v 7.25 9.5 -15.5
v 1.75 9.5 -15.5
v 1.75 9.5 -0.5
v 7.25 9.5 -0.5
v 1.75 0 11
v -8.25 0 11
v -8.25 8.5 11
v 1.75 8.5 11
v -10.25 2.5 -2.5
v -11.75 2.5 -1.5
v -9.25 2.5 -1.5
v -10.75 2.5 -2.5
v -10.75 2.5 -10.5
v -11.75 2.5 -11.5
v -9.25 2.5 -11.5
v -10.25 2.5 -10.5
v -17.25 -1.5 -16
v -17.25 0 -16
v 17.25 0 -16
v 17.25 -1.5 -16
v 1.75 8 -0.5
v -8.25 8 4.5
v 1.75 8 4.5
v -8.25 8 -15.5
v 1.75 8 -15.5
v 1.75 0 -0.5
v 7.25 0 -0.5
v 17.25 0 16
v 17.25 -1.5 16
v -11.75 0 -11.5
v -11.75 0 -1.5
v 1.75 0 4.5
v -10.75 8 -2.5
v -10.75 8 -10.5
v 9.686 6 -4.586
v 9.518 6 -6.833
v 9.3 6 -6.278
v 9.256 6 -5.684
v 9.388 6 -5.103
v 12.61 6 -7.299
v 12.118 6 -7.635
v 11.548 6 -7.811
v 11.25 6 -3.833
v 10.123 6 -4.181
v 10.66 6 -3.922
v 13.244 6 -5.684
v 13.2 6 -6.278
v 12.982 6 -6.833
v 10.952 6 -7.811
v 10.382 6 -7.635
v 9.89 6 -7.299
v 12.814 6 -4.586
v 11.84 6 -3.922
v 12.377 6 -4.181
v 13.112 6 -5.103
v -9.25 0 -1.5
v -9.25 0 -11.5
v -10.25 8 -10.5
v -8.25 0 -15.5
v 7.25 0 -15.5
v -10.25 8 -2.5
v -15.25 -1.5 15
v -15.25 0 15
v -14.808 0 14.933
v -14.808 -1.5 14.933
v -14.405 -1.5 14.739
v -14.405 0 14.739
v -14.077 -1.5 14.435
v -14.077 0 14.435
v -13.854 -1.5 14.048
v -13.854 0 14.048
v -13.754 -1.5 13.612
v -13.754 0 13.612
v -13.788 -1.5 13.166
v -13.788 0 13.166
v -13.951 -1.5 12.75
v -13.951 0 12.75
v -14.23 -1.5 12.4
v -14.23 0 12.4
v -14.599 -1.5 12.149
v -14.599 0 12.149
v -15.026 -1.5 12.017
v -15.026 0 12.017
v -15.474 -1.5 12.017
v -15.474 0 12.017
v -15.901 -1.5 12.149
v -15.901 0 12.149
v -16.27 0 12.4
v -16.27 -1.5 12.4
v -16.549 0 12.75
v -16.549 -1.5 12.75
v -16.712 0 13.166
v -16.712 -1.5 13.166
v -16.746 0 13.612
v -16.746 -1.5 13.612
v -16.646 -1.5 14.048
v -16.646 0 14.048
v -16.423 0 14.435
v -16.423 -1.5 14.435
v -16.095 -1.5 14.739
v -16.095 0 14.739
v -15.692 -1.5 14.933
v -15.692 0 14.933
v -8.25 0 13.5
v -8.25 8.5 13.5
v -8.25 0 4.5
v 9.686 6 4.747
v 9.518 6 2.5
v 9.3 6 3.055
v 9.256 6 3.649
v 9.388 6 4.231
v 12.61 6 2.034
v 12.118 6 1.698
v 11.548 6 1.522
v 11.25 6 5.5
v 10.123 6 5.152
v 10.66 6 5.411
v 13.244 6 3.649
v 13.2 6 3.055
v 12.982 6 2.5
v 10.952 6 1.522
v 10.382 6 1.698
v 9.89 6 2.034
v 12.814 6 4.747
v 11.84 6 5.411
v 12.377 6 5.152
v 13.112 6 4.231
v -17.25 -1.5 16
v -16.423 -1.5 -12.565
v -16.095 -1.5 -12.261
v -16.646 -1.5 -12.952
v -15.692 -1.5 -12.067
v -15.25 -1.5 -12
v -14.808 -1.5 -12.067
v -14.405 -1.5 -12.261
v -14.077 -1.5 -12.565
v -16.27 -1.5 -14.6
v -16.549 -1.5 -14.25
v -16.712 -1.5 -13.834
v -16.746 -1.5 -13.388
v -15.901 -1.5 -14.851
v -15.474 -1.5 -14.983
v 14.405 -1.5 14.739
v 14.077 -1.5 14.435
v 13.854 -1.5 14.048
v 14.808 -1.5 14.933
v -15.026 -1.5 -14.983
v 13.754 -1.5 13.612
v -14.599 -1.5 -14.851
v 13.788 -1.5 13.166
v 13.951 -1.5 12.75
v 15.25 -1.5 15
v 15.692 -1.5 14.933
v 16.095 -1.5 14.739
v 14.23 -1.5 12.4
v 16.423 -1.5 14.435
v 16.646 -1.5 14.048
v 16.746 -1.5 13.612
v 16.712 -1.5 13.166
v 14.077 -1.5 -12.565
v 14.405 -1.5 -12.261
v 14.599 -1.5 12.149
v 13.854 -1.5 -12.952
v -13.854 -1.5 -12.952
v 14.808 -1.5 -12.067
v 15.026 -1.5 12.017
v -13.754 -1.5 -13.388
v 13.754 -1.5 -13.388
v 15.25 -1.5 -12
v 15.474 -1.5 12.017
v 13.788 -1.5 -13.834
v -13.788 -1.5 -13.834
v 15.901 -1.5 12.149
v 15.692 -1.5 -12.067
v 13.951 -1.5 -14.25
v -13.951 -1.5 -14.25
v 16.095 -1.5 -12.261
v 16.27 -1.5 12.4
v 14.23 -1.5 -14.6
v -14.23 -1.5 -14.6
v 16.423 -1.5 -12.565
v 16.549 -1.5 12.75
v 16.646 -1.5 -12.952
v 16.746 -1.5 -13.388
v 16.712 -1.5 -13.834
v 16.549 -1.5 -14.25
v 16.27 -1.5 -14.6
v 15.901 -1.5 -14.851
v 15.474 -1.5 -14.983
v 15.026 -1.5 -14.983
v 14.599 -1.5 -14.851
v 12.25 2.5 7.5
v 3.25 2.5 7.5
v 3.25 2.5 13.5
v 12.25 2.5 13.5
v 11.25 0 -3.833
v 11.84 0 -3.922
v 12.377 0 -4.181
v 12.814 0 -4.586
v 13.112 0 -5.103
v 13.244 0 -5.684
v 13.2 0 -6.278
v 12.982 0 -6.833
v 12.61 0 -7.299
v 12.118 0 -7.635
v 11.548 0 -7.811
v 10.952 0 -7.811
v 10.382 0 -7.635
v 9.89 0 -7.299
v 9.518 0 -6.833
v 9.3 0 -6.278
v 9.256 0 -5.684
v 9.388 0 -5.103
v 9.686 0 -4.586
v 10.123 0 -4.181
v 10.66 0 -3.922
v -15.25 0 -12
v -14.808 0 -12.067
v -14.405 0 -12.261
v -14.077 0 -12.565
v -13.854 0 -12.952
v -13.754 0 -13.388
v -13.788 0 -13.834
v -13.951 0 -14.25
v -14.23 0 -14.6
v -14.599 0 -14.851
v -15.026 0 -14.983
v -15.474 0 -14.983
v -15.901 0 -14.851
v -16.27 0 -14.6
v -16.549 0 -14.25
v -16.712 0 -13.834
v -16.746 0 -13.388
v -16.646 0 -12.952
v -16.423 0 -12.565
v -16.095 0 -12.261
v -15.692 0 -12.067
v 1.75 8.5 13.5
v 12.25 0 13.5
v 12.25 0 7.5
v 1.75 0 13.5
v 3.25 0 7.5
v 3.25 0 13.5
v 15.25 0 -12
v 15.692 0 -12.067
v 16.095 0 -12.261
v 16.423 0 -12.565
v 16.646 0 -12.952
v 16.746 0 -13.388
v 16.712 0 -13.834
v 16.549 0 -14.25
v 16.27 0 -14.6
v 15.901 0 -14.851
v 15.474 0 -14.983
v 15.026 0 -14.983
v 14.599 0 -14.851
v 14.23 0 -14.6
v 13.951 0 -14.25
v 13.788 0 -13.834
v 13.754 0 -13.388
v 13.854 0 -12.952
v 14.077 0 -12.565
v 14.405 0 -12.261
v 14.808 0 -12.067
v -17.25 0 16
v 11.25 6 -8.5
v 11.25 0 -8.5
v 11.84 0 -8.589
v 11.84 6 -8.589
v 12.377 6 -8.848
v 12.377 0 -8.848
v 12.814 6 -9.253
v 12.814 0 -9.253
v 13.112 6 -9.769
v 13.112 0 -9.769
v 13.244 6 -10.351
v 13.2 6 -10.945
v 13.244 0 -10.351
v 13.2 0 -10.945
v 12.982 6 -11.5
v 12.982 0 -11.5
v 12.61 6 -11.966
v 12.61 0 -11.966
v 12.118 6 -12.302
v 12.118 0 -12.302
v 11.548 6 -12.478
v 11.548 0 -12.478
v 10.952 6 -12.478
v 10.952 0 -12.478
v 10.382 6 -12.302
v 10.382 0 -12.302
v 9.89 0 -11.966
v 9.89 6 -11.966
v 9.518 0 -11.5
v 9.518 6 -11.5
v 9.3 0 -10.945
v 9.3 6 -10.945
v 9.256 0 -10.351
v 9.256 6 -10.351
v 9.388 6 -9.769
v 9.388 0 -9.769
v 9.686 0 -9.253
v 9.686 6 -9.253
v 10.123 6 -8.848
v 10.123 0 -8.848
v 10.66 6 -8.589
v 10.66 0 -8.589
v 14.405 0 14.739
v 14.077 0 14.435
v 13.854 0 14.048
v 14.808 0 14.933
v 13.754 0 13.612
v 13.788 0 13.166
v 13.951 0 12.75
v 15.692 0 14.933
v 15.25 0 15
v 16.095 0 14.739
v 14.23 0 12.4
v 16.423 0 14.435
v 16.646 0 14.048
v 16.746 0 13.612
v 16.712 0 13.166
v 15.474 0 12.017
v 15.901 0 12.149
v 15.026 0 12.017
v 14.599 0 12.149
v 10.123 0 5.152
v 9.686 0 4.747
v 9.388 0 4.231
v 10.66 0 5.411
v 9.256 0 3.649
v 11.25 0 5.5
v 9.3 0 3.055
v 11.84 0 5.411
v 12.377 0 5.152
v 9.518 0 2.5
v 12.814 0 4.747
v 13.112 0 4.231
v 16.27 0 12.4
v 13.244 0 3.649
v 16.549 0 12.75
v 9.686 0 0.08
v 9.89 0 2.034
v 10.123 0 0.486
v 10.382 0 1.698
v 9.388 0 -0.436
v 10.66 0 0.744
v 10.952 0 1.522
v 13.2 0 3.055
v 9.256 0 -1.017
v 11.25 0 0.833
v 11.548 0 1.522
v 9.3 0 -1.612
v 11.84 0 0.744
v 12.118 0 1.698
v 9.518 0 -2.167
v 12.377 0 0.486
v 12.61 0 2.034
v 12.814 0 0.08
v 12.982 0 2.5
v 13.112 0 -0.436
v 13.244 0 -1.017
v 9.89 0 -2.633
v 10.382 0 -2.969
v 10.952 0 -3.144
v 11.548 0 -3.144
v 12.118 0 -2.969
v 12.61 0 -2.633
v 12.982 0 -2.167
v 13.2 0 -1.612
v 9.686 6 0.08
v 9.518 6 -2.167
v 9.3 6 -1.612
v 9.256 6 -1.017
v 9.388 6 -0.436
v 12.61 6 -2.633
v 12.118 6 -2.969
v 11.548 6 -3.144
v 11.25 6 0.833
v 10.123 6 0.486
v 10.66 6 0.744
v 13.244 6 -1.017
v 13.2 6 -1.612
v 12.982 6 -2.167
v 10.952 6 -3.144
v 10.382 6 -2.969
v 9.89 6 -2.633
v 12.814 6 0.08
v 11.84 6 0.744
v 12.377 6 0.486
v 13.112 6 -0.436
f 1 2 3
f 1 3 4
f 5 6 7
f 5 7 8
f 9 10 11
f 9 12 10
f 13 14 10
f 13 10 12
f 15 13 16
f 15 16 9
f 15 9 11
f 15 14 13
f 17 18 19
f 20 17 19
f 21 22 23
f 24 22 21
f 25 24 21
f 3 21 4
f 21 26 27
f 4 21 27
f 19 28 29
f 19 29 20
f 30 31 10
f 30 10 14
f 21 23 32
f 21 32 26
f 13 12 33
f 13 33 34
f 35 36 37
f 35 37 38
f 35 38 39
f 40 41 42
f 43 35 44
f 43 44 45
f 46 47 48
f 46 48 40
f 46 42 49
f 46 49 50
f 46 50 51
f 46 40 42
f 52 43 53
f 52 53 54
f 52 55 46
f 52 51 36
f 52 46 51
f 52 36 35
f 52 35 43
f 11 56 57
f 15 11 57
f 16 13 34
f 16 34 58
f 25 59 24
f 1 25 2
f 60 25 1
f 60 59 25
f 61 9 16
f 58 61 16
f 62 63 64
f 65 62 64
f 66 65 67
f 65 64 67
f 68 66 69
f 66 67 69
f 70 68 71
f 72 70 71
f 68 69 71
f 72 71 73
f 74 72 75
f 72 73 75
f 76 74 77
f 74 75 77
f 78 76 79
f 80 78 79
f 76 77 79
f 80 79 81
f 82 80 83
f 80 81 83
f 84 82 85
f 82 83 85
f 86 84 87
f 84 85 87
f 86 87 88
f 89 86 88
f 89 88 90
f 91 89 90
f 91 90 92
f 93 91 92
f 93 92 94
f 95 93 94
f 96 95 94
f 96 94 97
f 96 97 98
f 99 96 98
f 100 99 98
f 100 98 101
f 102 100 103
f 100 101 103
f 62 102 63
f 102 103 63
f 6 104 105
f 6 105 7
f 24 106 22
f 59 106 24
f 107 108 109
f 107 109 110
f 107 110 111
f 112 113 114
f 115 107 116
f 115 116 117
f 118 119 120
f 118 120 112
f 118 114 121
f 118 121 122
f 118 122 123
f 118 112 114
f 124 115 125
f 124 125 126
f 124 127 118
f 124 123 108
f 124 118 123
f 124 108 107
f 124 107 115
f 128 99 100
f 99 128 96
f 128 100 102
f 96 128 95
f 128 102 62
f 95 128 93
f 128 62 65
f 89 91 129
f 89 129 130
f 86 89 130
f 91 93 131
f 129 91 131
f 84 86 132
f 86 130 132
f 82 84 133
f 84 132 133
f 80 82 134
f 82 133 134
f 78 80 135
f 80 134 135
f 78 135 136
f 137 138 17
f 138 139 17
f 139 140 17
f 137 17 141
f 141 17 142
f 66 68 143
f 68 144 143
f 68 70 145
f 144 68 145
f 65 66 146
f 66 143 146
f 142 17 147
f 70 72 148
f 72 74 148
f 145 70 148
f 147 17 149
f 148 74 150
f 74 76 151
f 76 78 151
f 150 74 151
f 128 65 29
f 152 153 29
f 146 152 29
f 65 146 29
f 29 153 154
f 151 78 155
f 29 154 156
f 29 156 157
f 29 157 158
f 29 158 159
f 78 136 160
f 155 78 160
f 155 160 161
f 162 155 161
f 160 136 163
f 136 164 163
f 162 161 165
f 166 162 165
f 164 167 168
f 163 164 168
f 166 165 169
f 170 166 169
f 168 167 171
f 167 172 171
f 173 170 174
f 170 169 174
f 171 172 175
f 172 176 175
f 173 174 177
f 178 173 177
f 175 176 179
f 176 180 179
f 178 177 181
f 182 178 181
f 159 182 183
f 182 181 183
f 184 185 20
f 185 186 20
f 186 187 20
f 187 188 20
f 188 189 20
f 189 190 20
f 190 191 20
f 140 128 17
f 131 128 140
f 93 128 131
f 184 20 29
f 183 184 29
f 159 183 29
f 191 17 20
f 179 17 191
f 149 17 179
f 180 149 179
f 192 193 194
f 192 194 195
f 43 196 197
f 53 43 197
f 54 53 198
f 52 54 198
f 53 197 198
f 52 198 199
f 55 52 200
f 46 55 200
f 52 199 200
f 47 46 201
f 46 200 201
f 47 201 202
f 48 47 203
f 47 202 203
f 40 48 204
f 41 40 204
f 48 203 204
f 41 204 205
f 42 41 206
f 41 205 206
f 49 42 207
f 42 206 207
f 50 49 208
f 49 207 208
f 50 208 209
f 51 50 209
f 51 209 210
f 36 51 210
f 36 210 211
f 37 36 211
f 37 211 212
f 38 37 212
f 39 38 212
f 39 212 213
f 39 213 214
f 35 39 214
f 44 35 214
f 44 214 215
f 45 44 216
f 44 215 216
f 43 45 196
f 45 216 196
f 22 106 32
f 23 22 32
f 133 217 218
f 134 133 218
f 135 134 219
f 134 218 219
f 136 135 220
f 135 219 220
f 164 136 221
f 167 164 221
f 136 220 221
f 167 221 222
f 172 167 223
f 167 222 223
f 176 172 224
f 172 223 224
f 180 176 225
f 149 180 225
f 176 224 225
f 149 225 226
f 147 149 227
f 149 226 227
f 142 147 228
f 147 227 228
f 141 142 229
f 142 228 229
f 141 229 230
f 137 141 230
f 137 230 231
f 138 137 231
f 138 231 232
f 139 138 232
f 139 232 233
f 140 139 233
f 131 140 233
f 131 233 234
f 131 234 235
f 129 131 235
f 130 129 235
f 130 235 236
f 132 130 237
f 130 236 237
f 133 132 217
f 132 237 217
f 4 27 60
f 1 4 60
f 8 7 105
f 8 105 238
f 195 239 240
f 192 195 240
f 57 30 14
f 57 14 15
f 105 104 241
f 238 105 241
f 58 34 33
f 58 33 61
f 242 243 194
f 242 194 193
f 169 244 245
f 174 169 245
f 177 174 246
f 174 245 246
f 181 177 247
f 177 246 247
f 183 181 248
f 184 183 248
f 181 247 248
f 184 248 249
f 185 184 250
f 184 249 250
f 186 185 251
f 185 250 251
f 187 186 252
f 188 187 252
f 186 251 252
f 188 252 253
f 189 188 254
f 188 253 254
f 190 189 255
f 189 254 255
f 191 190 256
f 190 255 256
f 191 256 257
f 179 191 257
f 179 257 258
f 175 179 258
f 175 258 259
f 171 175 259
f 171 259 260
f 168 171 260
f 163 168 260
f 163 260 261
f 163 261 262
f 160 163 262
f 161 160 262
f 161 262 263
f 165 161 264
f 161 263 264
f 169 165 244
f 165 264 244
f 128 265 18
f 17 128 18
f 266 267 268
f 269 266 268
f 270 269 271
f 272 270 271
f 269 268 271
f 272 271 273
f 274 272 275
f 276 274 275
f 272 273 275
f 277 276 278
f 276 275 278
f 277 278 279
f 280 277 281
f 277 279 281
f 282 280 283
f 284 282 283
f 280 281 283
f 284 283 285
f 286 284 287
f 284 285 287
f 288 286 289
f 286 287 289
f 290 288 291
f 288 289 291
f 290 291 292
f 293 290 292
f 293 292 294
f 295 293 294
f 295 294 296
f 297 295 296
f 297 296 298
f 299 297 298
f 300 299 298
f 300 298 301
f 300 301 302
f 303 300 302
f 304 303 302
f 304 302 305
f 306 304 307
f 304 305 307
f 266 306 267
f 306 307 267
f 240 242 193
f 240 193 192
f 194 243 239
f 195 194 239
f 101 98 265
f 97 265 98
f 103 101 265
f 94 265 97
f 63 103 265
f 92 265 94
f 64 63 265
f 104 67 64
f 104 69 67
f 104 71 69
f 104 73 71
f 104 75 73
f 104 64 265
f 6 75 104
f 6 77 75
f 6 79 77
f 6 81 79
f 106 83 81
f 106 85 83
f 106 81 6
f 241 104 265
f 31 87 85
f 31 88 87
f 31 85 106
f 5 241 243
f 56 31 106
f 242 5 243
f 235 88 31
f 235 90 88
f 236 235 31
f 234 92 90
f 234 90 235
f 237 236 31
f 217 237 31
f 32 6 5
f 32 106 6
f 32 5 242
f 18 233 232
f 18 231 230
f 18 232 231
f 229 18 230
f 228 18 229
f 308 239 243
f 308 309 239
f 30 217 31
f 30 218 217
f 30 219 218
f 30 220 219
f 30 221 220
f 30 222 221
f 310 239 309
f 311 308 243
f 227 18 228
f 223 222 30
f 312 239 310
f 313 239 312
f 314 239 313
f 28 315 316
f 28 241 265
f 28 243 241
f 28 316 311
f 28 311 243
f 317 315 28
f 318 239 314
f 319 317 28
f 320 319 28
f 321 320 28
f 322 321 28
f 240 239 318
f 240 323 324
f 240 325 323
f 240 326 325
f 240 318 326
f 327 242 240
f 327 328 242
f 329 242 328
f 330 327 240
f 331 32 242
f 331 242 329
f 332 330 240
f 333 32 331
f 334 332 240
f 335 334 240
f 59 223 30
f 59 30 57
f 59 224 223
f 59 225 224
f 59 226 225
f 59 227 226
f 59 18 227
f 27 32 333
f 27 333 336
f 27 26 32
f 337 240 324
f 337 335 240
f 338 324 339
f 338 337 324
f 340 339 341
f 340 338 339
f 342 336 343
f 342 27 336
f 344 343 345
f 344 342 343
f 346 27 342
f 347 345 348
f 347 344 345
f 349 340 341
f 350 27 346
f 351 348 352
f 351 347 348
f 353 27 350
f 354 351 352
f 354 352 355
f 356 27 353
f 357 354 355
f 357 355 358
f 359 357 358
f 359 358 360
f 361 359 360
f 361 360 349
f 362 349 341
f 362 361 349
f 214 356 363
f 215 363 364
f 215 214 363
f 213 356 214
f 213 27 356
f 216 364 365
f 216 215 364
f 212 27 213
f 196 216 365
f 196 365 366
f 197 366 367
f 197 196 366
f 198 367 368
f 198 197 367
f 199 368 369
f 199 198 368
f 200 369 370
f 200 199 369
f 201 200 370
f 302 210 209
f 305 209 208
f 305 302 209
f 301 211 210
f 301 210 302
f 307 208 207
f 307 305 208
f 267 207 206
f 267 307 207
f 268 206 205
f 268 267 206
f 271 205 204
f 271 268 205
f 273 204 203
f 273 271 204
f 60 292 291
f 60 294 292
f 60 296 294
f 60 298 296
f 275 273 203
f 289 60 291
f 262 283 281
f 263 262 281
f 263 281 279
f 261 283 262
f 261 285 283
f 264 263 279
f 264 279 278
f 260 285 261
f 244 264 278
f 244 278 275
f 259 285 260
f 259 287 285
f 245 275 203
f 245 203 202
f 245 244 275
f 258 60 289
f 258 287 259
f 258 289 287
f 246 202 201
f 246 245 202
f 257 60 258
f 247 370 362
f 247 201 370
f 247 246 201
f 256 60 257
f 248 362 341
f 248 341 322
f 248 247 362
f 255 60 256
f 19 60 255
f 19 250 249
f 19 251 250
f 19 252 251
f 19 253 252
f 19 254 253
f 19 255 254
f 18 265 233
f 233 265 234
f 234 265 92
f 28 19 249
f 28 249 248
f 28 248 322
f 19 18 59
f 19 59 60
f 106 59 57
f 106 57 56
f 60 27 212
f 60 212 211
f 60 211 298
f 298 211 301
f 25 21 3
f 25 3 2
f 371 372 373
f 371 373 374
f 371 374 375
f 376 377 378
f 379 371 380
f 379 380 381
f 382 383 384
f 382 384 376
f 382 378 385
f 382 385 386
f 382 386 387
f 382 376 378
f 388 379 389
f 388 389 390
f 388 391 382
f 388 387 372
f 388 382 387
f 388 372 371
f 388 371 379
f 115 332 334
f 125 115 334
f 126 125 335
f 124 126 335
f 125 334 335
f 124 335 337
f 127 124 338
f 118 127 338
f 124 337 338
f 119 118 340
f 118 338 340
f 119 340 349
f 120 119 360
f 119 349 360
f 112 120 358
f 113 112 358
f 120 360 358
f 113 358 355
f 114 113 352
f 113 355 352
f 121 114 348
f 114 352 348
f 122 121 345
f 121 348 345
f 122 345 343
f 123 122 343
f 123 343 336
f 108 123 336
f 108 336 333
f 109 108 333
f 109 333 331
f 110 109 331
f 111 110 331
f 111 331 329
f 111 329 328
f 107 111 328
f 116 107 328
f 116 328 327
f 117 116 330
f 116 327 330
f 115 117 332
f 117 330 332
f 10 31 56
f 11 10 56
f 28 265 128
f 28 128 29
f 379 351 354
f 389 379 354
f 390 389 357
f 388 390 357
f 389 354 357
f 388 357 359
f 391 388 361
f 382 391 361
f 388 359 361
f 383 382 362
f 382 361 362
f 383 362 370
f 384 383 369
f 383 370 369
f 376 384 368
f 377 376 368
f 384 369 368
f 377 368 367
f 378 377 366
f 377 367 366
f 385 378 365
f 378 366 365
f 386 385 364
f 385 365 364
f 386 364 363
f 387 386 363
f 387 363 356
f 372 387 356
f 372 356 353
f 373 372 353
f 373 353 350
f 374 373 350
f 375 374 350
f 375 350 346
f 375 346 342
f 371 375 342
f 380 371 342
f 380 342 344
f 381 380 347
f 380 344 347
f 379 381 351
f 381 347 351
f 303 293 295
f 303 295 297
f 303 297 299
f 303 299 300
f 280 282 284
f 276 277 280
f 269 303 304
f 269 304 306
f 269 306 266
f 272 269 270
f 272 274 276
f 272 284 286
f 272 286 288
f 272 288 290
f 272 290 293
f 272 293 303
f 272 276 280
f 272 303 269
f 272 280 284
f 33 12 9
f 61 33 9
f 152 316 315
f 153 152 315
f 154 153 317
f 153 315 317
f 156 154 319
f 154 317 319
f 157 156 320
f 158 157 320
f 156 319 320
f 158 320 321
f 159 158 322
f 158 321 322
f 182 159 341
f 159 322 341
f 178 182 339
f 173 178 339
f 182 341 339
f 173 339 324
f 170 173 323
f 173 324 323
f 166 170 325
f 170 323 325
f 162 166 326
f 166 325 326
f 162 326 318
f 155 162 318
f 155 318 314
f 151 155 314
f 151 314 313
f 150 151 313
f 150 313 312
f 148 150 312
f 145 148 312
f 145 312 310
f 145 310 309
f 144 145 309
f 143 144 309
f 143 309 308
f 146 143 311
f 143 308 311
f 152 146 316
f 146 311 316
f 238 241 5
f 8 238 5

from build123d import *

# Parameters (mm, degrees)
SKETCH_1_W      = 34.5
SKETCH_1_H      = 32
SKETCH_1_R      = 1.5
EXTRUDE_1_DEPTH = 1.5
SKETCH_1_3_R    = 2
EXTRUDE_2_DEPTH = 6
SKETCH_1_4_W    = 9
SKETCH_1_4_H    = 6
EXTRUDE_3_DEPTH = 2.5
SKETCH_1_5_W    = 10
SKETCH_1_5_H    = 2.5
EXTRUDE_4_DEPTH = 8.5
SKETCH_1_6_W    = 5.5
SKETCH_1_6_H    = 15
EXTRUDE_5_DEPTH = 9.5
EXTRUDE_6_DEPTH = 8
SKETCH_1_9_W    = 0.5
SKETCH_1_9_H    = 8
EXTRUDE_7_DEPTH = 8
SKETCH_1_10_W   = 2.5
SKETCH_1_10_H   = 10
SKETCH_1_10_W_2 = 0.5
SKETCH_1_10_H_2 = 8
EXTRUDE_8_DEPTH = 2.5


with BuildPart() as part:
    # Эскиз1 → Бобышка-Вытянуть1 (new body)
    with BuildSketch(Plane(origin=(0, 0, 0), x_dir=(1, 0, 0), z_dir=(0, 1, 0))):
        Rectangle(SKETCH_1_W, SKETCH_1_H)
        with Locations((-15.25, -13.5)):
            Circle(SKETCH_1_R, mode=Mode.SUBTRACT)
        with Locations((15.25, -13.5)):
            Circle(SKETCH_1_R, mode=Mode.SUBTRACT)
        with Locations((-15.25, 13.5)):
            Circle(SKETCH_1_R, mode=Mode.SUBTRACT)
        with Locations((15.25, 13.5)):
            Circle(SKETCH_1_R, mode=Mode.SUBTRACT)
    extrude(amount=-EXTRUDE_1_DEPTH)

    # Эскиз1<3> → Бобышка-Вытянуть2 (add)
    with BuildSketch(Plane(origin=(0, 0, 0), x_dir=(1, 0, 0), z_dir=(0, 1, 0))):
        with Locations((11.25, 10.5)):
            Circle(SKETCH_1_3_R)
        with Locations((11.25, 5.833333333)):
            Circle(SKETCH_1_3_R)
        with Locations((11.25, 1.166666667)):
            Circle(SKETCH_1_3_R)
        with Locations((11.25, -3.5)):
            Circle(SKETCH_1_3_R)
    extrude(amount=EXTRUDE_2_DEPTH)

    # Эскиз1<4> → Бобышка-Вытянуть3 (add)
    with BuildSketch(Plane(origin=(0, 0, 0), x_dir=(1, 0, 0), z_dir=(0, 1, 0))):
        with Locations((7.75, -10.5)):
            Rectangle(SKETCH_1_4_W, SKETCH_1_4_H)
    extrude(amount=EXTRUDE_3_DEPTH)

    # Эскиз1<5> → Бобышка-Вытянуть4 (add)
    with BuildSketch(Plane(origin=(0, 0, 0), x_dir=(1, 0, 0), z_dir=(0, 1, 0))):
        with Locations((-3.25, -12.25)):
            Rectangle(SKETCH_1_5_W, SKETCH_1_5_H)
    extrude(amount=EXTRUDE_4_DEPTH)

    # Эскиз1<6> → Бобышка-Вытянуть5 (add)
    with BuildSketch(Plane(origin=(0, 0, 0), x_dir=(1, 0, 0), z_dir=(0, 1, 0))):
        with Locations((4.5, 8)):
            Rectangle(SKETCH_1_6_W, SKETCH_1_6_H)
    extrude(amount=EXTRUDE_5_DEPTH)

    # Эскиз1<7> → Бобышка-Вытянуть6 (add)
    with BuildSketch(Plane(origin=(0, 0, 0), x_dir=(1, 0, 0), z_dir=(0, 1, 0))):
        Polygon((1.75, 15.5), (-8.25, 15.5), (-8.25, -4.5), (1.75, -4.5), (1.75, 0.5), align=None)
    extrude(amount=EXTRUDE_6_DEPTH)

    # Эскиз1<9> → Бобышка-Вытянуть7 (add)
    with BuildSketch(Plane(origin=(0, 0, 0), x_dir=(1, 0, 0), z_dir=(0, 1, 0))):
        with Locations((-10.5, 6.5)):
            Rectangle(SKETCH_1_9_W, SKETCH_1_9_H)
    extrude(amount=EXTRUDE_7_DEPTH)

    # Эскиз1<10> → Бобышка-Вытянуть8 (add)
    with BuildSketch(Plane(origin=(0, 0, 0), x_dir=(1, 0, 0), z_dir=(0, 1, 0))):
        with Locations((-10.5, 6.5)):
            Rectangle(SKETCH_1_10_W, SKETCH_1_10_H)
        with Locations((-10.5, 6.5)):
            Rectangle(SKETCH_1_10_W_2, SKETCH_1_10_H_2, mode=Mode.SUBTRACT)
    extrude(amount=EXTRUDE_8_DEPTH)


solid = part.part
